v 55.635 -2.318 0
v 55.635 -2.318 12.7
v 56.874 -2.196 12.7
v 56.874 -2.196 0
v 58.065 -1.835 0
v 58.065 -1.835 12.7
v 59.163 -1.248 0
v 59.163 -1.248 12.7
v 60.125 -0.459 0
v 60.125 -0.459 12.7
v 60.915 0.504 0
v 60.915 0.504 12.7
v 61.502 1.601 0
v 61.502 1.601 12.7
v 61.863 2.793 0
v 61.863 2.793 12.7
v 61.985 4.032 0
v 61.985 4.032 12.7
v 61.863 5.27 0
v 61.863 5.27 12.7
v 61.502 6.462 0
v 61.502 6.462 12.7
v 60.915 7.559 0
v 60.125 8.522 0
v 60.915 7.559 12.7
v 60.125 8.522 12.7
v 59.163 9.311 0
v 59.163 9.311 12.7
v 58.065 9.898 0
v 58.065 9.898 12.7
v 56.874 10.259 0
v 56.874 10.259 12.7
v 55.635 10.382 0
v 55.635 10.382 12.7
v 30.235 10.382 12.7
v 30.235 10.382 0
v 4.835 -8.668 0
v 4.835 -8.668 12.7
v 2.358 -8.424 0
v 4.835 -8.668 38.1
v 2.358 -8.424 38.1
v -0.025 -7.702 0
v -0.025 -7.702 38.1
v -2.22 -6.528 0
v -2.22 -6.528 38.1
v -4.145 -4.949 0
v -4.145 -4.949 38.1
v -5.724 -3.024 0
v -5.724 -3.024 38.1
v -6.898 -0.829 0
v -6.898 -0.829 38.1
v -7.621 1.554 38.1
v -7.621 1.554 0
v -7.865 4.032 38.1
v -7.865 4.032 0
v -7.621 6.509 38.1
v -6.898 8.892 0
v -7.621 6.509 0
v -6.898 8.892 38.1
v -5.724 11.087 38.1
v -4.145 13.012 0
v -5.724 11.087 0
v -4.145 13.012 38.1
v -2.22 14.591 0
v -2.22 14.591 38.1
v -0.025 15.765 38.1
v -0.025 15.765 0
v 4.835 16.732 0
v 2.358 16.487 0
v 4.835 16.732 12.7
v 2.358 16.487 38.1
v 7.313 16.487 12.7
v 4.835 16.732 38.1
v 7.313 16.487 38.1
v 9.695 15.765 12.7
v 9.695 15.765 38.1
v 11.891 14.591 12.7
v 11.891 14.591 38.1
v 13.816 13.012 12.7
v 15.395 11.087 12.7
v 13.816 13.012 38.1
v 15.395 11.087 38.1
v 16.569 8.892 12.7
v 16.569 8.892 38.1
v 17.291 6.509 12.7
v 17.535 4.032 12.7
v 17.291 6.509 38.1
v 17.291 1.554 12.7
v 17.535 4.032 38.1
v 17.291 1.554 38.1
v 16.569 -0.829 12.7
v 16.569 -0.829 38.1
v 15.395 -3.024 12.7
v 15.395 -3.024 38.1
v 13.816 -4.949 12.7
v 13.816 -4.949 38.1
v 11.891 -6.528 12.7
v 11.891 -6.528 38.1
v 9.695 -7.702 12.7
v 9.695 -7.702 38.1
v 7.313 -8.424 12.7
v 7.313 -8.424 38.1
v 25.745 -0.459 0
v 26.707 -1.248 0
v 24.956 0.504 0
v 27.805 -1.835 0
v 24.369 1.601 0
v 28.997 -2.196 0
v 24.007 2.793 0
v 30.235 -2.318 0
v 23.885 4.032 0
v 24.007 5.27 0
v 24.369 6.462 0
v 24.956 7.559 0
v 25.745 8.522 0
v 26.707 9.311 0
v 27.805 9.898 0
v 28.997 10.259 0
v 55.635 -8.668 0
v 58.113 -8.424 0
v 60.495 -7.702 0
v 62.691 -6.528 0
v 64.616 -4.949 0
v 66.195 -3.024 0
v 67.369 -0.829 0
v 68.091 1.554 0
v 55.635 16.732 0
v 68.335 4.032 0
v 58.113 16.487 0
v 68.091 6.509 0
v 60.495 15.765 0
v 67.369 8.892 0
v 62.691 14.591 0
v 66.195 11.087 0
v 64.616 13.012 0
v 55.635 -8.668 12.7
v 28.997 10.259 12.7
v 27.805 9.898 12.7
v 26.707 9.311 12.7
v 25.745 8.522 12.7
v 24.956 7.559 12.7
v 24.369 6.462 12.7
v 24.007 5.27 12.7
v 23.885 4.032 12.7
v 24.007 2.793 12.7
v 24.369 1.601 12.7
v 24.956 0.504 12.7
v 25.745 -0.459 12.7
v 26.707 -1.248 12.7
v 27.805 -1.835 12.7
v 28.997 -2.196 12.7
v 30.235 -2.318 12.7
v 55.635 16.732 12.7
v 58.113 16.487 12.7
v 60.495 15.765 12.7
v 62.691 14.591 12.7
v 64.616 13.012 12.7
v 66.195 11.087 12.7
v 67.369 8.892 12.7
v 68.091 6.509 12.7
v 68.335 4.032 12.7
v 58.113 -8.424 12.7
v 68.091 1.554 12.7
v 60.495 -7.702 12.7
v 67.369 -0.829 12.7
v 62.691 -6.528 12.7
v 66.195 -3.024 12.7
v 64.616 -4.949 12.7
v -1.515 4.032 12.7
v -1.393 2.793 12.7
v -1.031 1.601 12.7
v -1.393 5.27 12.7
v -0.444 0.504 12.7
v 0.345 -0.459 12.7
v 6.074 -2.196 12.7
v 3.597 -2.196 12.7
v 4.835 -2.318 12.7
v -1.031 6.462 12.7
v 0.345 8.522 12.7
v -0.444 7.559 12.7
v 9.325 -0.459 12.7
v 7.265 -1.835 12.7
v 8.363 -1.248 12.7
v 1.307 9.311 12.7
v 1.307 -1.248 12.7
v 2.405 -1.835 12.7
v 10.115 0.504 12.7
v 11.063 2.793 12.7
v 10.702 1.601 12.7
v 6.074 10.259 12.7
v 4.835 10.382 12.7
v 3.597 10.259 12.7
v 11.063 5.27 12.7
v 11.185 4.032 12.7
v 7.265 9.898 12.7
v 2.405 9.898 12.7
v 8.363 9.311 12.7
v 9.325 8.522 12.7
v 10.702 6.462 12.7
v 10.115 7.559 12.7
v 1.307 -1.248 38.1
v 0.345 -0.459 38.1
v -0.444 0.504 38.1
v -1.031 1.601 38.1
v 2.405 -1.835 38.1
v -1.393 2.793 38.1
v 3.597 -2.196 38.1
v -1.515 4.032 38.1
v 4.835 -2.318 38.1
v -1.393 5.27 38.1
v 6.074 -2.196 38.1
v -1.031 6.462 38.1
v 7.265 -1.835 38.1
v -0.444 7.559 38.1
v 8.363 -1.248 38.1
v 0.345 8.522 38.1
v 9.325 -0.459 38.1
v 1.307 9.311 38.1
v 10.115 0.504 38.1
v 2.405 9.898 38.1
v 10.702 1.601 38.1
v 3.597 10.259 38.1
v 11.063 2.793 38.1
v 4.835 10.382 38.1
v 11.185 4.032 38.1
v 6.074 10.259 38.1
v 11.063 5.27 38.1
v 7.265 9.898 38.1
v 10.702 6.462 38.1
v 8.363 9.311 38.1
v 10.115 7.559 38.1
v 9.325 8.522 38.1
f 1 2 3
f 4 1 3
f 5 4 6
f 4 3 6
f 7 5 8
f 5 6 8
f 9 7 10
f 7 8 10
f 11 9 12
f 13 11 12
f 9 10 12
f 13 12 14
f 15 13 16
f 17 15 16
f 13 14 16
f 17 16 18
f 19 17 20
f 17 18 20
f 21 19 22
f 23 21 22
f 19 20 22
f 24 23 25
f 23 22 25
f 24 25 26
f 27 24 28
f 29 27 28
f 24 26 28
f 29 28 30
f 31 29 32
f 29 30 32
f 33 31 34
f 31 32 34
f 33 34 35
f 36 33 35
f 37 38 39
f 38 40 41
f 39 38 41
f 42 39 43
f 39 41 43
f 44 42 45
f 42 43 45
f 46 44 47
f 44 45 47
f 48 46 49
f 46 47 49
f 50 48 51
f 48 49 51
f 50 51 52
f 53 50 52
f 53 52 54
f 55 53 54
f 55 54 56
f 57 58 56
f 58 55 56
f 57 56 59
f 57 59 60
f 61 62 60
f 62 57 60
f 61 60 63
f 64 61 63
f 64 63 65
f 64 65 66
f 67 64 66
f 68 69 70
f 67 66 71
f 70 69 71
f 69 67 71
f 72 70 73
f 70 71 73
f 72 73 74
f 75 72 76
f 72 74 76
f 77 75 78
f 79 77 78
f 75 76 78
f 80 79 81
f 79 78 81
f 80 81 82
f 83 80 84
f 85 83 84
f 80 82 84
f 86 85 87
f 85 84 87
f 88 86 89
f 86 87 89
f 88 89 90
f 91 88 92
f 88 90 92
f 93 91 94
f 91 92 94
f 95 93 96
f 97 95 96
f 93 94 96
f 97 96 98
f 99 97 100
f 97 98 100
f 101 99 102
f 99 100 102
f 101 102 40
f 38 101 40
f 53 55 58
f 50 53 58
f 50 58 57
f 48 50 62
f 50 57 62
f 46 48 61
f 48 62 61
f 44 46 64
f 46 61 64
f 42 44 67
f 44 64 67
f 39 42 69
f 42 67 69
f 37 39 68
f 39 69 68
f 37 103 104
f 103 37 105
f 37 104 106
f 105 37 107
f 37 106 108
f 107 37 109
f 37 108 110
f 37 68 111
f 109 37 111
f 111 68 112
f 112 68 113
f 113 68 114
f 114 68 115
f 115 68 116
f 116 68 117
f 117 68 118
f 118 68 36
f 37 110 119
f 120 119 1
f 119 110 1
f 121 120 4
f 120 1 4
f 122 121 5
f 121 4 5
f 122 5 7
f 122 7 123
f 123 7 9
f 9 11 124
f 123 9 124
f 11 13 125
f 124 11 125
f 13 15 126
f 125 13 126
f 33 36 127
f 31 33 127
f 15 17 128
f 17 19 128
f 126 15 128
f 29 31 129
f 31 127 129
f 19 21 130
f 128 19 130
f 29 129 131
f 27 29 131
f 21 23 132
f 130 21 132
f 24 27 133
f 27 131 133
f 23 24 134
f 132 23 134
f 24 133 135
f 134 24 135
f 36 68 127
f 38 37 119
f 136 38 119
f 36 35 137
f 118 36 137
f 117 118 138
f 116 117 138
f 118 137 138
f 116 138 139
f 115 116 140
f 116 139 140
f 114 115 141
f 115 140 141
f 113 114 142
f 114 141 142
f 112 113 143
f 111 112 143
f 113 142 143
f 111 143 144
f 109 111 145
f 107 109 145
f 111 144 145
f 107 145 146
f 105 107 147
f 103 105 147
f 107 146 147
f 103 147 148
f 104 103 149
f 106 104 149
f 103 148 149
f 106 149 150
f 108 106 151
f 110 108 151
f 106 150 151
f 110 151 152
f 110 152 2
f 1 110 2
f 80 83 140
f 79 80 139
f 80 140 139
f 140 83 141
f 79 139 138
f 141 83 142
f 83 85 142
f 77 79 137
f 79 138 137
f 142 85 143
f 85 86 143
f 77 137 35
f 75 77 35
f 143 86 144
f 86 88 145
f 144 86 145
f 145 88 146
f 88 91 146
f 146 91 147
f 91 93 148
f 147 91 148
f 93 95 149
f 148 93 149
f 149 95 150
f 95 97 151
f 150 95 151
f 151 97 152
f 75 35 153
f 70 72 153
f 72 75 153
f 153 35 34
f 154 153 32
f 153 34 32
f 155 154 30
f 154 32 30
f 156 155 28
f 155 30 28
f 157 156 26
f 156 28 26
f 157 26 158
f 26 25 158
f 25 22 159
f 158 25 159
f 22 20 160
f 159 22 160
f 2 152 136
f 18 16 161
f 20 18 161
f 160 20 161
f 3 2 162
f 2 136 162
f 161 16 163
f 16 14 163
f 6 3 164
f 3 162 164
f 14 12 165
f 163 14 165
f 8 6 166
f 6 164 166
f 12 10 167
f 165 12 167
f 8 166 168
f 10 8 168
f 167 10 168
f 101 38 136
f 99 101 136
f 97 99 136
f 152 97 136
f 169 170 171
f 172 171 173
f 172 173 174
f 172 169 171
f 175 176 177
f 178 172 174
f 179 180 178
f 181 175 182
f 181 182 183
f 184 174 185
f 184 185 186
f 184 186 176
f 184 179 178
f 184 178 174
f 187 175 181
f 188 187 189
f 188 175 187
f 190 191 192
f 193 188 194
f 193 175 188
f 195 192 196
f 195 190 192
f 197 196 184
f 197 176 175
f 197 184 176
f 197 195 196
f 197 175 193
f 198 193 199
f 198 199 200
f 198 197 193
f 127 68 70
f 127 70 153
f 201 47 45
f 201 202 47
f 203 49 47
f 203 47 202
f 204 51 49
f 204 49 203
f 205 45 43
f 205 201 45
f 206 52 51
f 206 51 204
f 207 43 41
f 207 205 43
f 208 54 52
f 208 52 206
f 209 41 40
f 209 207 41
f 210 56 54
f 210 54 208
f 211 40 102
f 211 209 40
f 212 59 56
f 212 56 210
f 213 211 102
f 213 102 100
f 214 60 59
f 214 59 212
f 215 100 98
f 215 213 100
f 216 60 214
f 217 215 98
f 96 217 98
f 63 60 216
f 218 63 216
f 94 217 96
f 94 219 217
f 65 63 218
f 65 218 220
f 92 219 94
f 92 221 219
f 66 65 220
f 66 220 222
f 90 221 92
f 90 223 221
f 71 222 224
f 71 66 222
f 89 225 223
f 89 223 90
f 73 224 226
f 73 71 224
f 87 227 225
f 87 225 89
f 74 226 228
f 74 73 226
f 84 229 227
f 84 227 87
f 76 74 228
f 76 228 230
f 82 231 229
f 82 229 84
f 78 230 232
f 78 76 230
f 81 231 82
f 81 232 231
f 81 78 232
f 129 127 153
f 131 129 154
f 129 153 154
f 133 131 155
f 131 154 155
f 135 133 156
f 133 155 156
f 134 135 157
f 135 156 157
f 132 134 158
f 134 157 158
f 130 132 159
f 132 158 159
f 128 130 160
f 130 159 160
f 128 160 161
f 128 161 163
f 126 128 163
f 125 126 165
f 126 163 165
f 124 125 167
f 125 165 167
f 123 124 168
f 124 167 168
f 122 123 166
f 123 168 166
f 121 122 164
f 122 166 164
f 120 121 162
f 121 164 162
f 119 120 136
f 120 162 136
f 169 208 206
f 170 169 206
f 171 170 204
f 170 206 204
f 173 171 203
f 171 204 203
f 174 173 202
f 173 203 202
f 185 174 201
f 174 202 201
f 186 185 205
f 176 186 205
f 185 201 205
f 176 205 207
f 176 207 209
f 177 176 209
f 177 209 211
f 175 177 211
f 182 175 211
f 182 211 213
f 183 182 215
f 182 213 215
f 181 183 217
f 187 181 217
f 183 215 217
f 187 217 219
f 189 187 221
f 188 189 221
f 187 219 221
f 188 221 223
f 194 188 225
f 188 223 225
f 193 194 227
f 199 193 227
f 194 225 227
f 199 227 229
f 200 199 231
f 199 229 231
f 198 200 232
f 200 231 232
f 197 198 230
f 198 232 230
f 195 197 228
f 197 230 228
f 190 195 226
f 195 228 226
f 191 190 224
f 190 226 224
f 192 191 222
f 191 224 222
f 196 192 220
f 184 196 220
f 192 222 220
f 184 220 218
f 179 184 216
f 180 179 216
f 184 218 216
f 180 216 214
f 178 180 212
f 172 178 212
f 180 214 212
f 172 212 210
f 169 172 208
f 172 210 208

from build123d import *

# Parameters (mm, degrees)
F0_W      = 76.2
F0_H      = 25.4
F1_DEPTH  = 38.1
F2_W      = 50.8
F2_H      = 25.4
F3_DEPTH  = 25.4
F5_DEPTH  = 25.4
F7_DEPTH  = 25.4
F8_DEPTH  = 25.4
F10_DEPTH = 25.4
F12_DEPTH = 25.4


with BuildPart() as f1:
    # F0 (on Top) → F1 (new body)
    with BuildSketch(Plane.XY):
        with Locations((30.2353623112, 4.0315114893)):
            Rectangle(F0_W, F0_H)
    extrude(amount=F1_DEPTH)

    # F2 (on face) → F3 (cut)
    with BuildSketch(Plane.XZ.offset(8.6684885107)):
        with Locations((42.9353623112, 25.4)):
            Rectangle(F2_W, F2_H)
    extrude(amount=-F3_DEPTH, mode=Mode.SUBTRACT)

    # F4 (on face) → F5 (cut)
    with BuildSketch(Plane.XY.offset(38.1)):
        with BuildLine():
            ThreePointArc((11.1853623112, 4.0315114893), (4.8353623112, 10.3815114893), (-1.5146376888, 4.0315114893))
            Line((-1.5146376888, 4.0315114893), (11.1853623112, 4.0315114893))
        make_face()
        with BuildLine():
            Line((11.1853623112, 4.0315114893), (-1.5146376888, 4.0315114893))
            ThreePointArc((-1.5146376888, 4.0315114893), (4.8353623112, -2.3184885107), (11.1853623112, 4.0315114893))
        make_face()
    extrude(amount=-F5_DEPTH, mode=Mode.SUBTRACT)

    # F6 (on face) → F7 (cut)
    with BuildSketch(Plane.XY.offset(38.1)):
        with BuildLine():
            ThreePointArc((-7.8646376888, 4.0315114893), (-4.1448937926, 13.0117676276), (4.8353623599, 16.7315114893))
            Line((4.8353623599, 16.7315114893), (-7.8646376888, 16.7315114893))
            Line((-7.8646376888, 16.7315114893), (-7.8646376888, 4.0315114893))
        make_face()
        with BuildLine():
            Line((-7.8646376888, -8.6684885107), (4.8353623112, -8.6684885107))
            ThreePointArc((4.8353623112, -8.6684885107), (-4.1448938098, -4.9487446318), (-7.8646376888, 4.0315114893))
            Line((-7.8646376888, 4.0315114893), (-7.8646376888, -8.6684885107))
        make_face()
        with BuildLine():
            Line((17.5353623112, -8.6684885107), (17.5353623112, 4.0315114893))
            ThreePointArc((17.5353623112, 4.0315114893), (13.8156184323, -4.9487446318), (4.8353623112, -8.6684885107))
            Line((4.8353623112, -8.6684885107), (17.5353623112, -8.6684885107))
        make_face()
        with BuildLine():
            ThreePointArc((4.8353623599, 16.7315114893), (13.8156184495, 13.0117675932), (17.5353623112, 4.0315114893))
            Line((17.5353623112, 4.0315114893), (17.5353623112, 16.7315114893))
            Line((17.5353623112, 16.7315114893), (4.8353623599, 16.7315114893))
        make_face()
    extrude(amount=-F7_DEPTH, mode=Mode.SUBTRACT)

    # F8 (cut): faces of the model
    f8_faces = [f1.faces().sort_by_distance(p)[0] for p in [
        (-5.0278648642, 13.8947386647, 12.7),
        (-5.0278648642, -5.8317156861, 12.7),
    ]]
    extrude(f8_faces, amount=-F8_DEPTH, mode=Mode.SUBTRACT)

    # F9 (on face) → F10 (cut)
    with BuildSketch(Plane.XY.offset(12.7)):
        with BuildLine():
            Line((30.2353623112, -2.3184885107), (55.6353623112, -2.3184885107))
            ThreePointArc((55.6353623112, -2.3184885107), (61.9853623112, 4.0315114893), (55.6353623112, 10.3815114893))
            Line((55.6353623112, 10.3815114893), (30.2353623112, 10.3815114893))
            ThreePointArc((30.2353623112, 10.3815114893), (23.8853623112, 4.0315114893), (30.2353623112, -2.3184885107))
        make_face()
    extrude(amount=-F10_DEPTH, mode=Mode.SUBTRACT)

    # F11 (on face) → F12 (cut)
    with BuildSketch(Plane.XY.offset(12.7)):
        with BuildLine():
            ThreePointArc((55.6353623112, 16.7315114893), (64.6156184323, 13.0117676104), (68.3353623112, 4.0315114893))
            Line((68.3353623112, 4.0315114893), (68.3353623112, 16.7315114893))
            Line((68.3353623112, 16.7315114893), (55.6353623112, 16.7315114893))
        make_face()
        with BuildLine():
            Line((68.3353623112, -8.6684885107), (68.3353623112, 4.0315114893))
            ThreePointArc((68.3353623112, 4.0315114893), (64.6156183701, -4.948744694), (55.6353621352, -8.6684885107))
            Line((55.6353621352, -8.6684885107), (68.3353623112, -8.6684885107))
        make_face()
    extrude(amount=-F12_DEPTH, mode=Mode.SUBTRACT)


solid = f1.part
